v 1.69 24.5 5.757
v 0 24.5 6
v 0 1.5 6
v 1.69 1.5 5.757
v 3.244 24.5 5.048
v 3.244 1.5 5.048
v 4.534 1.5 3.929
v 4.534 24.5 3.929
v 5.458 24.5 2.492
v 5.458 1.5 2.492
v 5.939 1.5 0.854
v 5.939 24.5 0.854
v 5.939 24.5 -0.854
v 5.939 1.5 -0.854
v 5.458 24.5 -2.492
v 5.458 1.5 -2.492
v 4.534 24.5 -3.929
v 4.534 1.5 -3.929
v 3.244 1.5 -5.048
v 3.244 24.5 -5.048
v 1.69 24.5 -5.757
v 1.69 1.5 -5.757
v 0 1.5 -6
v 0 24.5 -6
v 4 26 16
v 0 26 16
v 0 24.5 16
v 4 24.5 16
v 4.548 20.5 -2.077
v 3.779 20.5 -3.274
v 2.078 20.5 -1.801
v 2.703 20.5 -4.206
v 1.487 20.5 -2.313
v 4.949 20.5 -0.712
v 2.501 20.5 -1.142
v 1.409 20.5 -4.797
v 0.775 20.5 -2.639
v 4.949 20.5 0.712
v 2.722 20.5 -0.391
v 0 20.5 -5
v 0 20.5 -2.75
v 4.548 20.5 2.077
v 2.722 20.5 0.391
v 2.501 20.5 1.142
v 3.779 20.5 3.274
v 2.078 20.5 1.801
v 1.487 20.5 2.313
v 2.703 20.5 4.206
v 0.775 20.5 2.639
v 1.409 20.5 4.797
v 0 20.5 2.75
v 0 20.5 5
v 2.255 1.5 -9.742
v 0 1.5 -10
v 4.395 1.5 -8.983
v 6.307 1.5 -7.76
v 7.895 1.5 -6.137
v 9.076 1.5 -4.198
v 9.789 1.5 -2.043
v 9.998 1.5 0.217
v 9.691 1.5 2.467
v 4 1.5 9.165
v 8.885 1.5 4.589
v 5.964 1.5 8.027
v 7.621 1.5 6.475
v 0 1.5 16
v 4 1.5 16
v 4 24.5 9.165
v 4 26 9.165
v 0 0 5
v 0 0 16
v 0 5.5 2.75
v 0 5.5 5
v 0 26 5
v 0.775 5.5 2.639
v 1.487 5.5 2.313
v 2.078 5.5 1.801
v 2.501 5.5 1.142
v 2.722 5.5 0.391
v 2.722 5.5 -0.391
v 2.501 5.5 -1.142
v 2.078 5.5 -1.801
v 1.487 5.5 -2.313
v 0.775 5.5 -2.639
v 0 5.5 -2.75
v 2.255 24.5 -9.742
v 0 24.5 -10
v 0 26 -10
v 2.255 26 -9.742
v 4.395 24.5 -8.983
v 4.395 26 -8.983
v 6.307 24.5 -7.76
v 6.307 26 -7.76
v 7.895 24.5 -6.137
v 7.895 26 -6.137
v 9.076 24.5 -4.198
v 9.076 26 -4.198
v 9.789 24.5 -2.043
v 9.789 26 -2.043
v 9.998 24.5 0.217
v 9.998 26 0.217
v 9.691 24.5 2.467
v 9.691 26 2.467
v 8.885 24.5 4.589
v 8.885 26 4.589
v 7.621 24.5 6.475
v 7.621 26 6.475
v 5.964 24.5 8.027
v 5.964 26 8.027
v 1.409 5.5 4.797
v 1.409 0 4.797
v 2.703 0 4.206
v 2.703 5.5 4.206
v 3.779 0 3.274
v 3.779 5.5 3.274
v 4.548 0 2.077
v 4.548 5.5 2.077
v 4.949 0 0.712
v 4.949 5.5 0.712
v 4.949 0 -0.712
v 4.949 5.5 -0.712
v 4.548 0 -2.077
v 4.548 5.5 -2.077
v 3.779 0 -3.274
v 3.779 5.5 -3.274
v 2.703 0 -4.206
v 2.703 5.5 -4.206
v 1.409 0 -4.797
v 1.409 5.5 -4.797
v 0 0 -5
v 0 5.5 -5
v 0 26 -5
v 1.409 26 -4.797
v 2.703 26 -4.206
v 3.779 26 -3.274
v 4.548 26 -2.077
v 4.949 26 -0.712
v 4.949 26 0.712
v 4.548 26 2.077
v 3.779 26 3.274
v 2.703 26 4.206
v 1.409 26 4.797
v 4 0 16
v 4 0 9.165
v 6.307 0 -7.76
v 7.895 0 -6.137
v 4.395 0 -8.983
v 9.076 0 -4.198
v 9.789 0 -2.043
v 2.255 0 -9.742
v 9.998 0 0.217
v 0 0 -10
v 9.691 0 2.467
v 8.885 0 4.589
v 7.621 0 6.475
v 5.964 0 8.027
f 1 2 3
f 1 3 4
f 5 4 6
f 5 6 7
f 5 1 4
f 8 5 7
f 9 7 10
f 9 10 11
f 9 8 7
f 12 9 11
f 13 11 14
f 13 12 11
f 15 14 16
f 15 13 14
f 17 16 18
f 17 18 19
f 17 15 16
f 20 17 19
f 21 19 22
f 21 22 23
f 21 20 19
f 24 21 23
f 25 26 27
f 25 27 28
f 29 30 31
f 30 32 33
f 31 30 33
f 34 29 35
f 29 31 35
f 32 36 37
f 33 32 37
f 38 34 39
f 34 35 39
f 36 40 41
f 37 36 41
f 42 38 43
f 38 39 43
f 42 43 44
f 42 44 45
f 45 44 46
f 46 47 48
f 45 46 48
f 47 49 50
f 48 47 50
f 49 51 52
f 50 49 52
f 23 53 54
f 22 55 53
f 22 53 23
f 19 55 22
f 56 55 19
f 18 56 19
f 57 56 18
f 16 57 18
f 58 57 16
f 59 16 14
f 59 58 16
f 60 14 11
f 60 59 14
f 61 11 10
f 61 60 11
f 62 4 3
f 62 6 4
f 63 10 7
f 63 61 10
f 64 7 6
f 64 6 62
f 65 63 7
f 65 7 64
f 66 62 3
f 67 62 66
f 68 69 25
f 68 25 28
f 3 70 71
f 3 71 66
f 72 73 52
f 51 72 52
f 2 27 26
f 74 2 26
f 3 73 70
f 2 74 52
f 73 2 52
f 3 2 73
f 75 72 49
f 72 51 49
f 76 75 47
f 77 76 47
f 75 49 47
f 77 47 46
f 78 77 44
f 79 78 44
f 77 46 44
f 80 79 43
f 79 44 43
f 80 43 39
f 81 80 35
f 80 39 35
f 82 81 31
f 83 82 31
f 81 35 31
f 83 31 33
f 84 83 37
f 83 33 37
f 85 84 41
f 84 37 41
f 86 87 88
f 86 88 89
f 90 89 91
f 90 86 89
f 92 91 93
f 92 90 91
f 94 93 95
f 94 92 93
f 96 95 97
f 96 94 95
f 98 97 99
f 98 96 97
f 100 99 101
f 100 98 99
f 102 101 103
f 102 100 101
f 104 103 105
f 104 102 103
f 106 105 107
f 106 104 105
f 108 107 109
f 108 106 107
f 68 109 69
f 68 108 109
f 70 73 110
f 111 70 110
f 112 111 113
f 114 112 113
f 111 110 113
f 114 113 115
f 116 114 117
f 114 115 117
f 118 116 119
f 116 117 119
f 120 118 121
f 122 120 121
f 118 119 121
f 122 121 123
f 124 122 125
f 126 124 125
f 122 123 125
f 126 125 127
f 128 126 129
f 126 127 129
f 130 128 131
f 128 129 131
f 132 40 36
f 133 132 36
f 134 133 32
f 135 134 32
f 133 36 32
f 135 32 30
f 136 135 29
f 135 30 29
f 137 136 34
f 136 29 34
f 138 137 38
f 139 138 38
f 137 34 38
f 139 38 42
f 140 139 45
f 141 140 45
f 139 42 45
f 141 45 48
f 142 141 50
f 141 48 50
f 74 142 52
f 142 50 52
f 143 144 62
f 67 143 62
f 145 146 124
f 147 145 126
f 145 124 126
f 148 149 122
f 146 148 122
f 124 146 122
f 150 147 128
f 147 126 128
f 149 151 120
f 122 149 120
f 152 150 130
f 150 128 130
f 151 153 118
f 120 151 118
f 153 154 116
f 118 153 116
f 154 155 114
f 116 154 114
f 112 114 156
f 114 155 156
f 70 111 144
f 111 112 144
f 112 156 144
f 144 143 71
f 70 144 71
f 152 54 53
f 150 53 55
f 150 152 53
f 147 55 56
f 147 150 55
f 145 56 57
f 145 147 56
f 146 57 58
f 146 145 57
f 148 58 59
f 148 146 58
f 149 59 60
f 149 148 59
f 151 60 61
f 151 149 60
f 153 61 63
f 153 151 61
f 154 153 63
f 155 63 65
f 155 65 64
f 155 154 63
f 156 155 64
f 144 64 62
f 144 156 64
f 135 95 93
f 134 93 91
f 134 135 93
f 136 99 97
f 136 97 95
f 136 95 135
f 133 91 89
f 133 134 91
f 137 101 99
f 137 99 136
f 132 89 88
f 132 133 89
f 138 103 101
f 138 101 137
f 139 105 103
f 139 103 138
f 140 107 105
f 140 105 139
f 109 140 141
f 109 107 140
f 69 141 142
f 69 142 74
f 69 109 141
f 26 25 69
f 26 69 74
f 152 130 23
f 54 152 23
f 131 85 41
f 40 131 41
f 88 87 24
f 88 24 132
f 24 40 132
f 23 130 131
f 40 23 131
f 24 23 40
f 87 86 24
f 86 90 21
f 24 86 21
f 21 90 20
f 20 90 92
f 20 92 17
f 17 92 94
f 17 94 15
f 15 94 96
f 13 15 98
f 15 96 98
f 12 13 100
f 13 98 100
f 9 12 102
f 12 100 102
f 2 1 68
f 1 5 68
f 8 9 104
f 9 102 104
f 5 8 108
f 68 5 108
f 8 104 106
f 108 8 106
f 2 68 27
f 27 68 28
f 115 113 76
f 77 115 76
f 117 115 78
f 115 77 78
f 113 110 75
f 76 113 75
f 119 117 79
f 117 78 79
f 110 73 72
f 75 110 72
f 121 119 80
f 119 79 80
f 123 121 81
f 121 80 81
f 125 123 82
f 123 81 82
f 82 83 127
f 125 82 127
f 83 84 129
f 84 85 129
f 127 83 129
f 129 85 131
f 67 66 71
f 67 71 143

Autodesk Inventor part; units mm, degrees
ref_plane "YZ Plane" through (0, 0, 0) normal (1, 0, 0) x (0, 1, 0)
ref_plane "XZ Plane" through (0, 0, 0) normal (0, 1, 0) x (-1, 0, 0)
sketch "Sketch1" plane through (0, 0, 0) normal (0, 1, 0) x (-1, 0, 0)
  circle A0 centre (0, 0) radius 10
  dimension "d0" = 20
extrude "Extrusion1" add sketch "Sketch1" along normal blind 26
sketch "Sketch2" plane through (0, 0, 0) normal (0, -1, 0) x (1, 0, 0)
  point P0 (0, 0)
  point P1 (0, 0)
hole "Hole1" at (0, 0, 0) direction (0, 1, 0) diameter 5.5 end through all counterbore diameter 10 counterbore depth 5.5 clearance for "Socket Head Cap Screw DIN EN ISO 4762" size "M5" standard "DIN"
sketch "Sketch3" plane through (0, 0, 0) normal (1, 0, 0) x (0, 1, 0)
  line L0 (24.5, 10) -> (1.5, 10)
  line L1 (1.5, 10) -> (1.5, 6)
  line L2 (1.5, 6) -> (24.5, 6)
  line L3 (24.5, 6) -> (24.5, 10)
  line L4 (26, -10) -> (26, 10) projected
  line L5 (-4.4, 0) -> (26.4, 0) projected
  point P0 (0, 0)
  dimension "d10" = 6
  dimension "d11" = 1.5
  dimension "d12" = 1.5
revolve "Revolution1" cut sketch "Sketch3" angle 360 about axis through (0, -10, 0) along (0, 1, 0)
sketch "Sketch5" plane through (0, 26, 0) normal (0, 1, 0) x (1, 0, 0)
  circle A0 centre (0, 0) radius 2.75 projected
hole "Hole2" at (0, 26, 0) direction (0, -1, 0) diameter 5.5 end through all counterbore diameter 10 counterbore depth 5.5 clearance for "Socket Head Cap Screw DIN EN ISO 4762" size "M5" standard "DIN"
sketch "Sketch7" plane through (0, 0, 0) normal (1, 0, 0) x (0, 1, 0)
  line L0 (-12.4894, -25.9847) -> (40.6535, -25.9847)
  line L1 (40.6535, -25.9847) -> (40.6535, 26.2362)
  line L2 (40.6535, 26.2362) -> (-12.4894, 26.2362)
  line L3 (-12.4894, 26.2362) -> (-12.4894, -25.9847)
  point P0 (0, 0)
extrude "Extrusion3" cut sketch "Sketch7" against normal blind 15
ref_plane "Work Plane1" through (0, 0, 6) normal (0, 0, 1) x (1, 0, 0)
sketch "Sketch8" plane through (0, 0, 6) normal (0, 0, 1) x (1, 0, 0)
  line L0 (0, 0) -> (10, 0) projected
  line L1 (0, 1.5) -> (10, 1.5) projected
  line L2 (0, 0) -> (4, 0)
  line L3 (4, 0) -> (4, 1.5)
  line L4 (4, 1.5) -> (0, 1.5)
  line L5 (0, 1.5) -> (0, 0)
  line L6 (0, 20.5) -> (0, 26) projected
  line L7 (10, 24.5) -> (0, 24.5) projected
  line L8 (0, 26) -> (4, 26)
  line L9 (4, 26) -> (4, 24.5)
  line L10 (4, 24.5) -> (0, 24.5)
  line L11 (0, 24.5) -> (0, 26)
  dimension "d26" = 4
extrude "Extrusion4" add sketch "Sketch8" along normal blind 10
properties part number "Test2" material "ABS Plastic"
